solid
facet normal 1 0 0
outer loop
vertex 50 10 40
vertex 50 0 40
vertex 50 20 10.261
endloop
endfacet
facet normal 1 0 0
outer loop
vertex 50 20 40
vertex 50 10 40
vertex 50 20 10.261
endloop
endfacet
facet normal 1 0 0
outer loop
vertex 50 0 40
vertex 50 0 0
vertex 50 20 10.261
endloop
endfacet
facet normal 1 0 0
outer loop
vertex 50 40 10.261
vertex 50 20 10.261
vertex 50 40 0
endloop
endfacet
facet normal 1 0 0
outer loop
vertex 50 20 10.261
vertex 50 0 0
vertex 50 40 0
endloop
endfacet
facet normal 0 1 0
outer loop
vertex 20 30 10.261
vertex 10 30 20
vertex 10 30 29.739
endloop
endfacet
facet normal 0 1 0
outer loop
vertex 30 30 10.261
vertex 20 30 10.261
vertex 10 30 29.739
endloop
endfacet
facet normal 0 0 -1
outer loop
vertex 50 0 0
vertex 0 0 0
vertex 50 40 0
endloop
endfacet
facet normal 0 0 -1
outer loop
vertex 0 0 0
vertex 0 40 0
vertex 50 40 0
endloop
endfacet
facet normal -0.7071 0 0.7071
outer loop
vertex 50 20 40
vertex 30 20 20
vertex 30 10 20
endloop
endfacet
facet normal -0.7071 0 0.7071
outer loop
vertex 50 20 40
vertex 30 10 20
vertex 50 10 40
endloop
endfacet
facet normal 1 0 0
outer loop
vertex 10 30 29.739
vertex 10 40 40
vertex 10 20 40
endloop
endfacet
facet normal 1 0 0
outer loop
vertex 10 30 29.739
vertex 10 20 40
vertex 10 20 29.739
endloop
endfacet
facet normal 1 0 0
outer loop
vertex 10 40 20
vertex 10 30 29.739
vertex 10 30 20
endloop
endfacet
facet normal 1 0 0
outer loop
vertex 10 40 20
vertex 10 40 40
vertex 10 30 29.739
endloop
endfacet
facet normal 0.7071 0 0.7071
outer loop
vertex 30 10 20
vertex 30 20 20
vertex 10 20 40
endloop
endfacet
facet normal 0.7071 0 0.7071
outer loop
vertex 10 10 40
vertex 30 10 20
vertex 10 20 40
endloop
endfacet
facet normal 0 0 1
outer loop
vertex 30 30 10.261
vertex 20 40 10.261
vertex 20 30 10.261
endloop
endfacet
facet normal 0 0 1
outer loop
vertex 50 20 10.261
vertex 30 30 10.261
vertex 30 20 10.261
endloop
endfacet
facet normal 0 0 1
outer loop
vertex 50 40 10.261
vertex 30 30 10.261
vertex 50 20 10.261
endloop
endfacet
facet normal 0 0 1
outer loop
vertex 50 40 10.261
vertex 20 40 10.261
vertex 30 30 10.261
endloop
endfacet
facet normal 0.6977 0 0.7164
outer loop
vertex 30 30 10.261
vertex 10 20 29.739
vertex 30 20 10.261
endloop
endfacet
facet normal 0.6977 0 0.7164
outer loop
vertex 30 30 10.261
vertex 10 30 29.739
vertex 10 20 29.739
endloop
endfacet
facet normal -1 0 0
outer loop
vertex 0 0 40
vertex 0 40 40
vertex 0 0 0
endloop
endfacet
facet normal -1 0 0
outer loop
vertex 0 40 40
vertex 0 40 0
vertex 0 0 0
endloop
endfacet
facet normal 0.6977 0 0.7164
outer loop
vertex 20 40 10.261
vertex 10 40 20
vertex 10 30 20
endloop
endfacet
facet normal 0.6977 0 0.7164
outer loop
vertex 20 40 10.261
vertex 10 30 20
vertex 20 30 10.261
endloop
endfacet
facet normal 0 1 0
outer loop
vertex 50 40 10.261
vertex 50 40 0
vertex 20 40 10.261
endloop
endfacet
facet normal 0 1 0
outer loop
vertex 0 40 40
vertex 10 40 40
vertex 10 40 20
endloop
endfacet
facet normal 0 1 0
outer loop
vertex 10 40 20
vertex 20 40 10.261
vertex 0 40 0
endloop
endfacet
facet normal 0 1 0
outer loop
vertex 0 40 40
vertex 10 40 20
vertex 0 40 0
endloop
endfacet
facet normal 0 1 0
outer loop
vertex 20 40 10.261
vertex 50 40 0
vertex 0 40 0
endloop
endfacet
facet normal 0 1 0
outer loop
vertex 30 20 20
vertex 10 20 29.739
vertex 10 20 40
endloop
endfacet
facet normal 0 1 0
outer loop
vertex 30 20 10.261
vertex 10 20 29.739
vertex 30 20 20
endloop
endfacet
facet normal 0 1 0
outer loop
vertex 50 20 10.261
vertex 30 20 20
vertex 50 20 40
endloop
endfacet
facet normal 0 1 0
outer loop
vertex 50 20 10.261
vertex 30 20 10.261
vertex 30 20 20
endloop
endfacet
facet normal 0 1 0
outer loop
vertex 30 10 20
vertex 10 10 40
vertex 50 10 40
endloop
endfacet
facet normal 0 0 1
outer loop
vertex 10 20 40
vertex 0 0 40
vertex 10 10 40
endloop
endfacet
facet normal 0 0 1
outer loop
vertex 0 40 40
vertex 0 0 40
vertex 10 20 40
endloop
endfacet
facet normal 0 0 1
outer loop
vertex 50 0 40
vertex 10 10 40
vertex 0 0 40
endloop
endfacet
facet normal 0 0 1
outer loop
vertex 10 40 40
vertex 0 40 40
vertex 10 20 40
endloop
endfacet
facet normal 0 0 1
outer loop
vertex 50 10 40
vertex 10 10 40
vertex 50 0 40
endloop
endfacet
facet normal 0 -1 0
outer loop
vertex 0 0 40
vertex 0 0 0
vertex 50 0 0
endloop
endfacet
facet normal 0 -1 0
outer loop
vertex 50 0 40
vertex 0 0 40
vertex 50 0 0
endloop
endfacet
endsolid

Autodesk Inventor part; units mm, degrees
ref_plane "YZ Plane" through (0, 0, 0) normal (1, 0, 0) x (0, 1, 0)
ref_plane "XZ Plane" through (0, 0, 0) normal (0, 1, 0) x (-1, 0, 0)
ref_plane "XY Plane" through (0, 0, 0) normal (0, 0, 1) x (1, 0, 0)
sketch "草圖1" plane through (0, 0, 0) normal (0, 0, 1) x (1, 0, 0)
  line L0 (0, 0) -> (50, 0)
  line L1 (50, 0) -> (50, 40)
  line L2 (50, 40) -> (0, 40)
  line L3 (0, 40) -> (0, 0)
  dimension "d0" = 50
  dimension "d1" = 40
extrude "擠出1" add sketch "草圖1" along normal blind 40
sketch "草圖2" plane through (0, 40, 0) normal (0, 1, 0) x (1, 0, 0)
  line L0 (50, 0) -> (0, 0) projected
  line L1 (0, 0) -> (0, -40) projected
  line L2 (50, -40) -> (0, -40) projected
  line L3 (50, 0) -> (50, -40) projected
  line L4 (10, -40) -> (10, -20)
  line L5 (10, -20) -> (20, -10.2609)
  line L6 (20, -10.2609) -> (50, -10.2609)
  line L7 (50, 0) -> (50, -40) projected
  point P0 (0, 0)
  dimension "d4" = 10
  dimension "d5" = 10.2608
  dimension "d6" = 30
  dimension "d7" = 20
extrude "擠出2" cut sketch "草圖2" against normal blind 10 contours L3 L2 L4 L5 L6
sketch "草圖3" plane through (0, 30, 0) normal (0, 1, 0) x (1, 0, 0)
  line L0 (50, -10.2609) -> (50, -40) projected
  line L1 (20, -10.2609) -> (50, -10.2609) projected
  line L2 (10, -20) -> (20, -10.2609) projected
  line L3 (10, -40) -> (10, -20) projected
  line L4 (50, -40) -> (10, -40) projected
  line L5 (10, -29.7391) -> (30, -10.2609)
  point P0 (0, 0)
  dimension "d10" = 10
extrude "擠出3" cut sketch "草圖3" against normal blind 10 contours L0 L4 L3 L5 L1
sketch "草圖4" plane through (0, 20, 0) normal (0, 1, 0) x (1, 0, 0)
  line L0 (50, -10.2609) -> (50, -40) projected
  line L1 (30, -10.2609) -> (50, -10.2609) projected
  line L2 (10, -29.7391) -> (30, -10.2609) projected
  line L3 (10, -40) -> (10, -29.7391) projected
  line L4 (50, -40) -> (10, -40) projected
  line L5 (0, -40) -> (50, -40) projected
  line L6 (30, -20) -> (50, -40)
  line L7 (30, -20) -> (10, -40)
  point P0 (0, 0)
  dimension "d15" = 20
extrude "擠出4" cut sketch "草圖4" against normal blind 10 contours L4 L7 L6
